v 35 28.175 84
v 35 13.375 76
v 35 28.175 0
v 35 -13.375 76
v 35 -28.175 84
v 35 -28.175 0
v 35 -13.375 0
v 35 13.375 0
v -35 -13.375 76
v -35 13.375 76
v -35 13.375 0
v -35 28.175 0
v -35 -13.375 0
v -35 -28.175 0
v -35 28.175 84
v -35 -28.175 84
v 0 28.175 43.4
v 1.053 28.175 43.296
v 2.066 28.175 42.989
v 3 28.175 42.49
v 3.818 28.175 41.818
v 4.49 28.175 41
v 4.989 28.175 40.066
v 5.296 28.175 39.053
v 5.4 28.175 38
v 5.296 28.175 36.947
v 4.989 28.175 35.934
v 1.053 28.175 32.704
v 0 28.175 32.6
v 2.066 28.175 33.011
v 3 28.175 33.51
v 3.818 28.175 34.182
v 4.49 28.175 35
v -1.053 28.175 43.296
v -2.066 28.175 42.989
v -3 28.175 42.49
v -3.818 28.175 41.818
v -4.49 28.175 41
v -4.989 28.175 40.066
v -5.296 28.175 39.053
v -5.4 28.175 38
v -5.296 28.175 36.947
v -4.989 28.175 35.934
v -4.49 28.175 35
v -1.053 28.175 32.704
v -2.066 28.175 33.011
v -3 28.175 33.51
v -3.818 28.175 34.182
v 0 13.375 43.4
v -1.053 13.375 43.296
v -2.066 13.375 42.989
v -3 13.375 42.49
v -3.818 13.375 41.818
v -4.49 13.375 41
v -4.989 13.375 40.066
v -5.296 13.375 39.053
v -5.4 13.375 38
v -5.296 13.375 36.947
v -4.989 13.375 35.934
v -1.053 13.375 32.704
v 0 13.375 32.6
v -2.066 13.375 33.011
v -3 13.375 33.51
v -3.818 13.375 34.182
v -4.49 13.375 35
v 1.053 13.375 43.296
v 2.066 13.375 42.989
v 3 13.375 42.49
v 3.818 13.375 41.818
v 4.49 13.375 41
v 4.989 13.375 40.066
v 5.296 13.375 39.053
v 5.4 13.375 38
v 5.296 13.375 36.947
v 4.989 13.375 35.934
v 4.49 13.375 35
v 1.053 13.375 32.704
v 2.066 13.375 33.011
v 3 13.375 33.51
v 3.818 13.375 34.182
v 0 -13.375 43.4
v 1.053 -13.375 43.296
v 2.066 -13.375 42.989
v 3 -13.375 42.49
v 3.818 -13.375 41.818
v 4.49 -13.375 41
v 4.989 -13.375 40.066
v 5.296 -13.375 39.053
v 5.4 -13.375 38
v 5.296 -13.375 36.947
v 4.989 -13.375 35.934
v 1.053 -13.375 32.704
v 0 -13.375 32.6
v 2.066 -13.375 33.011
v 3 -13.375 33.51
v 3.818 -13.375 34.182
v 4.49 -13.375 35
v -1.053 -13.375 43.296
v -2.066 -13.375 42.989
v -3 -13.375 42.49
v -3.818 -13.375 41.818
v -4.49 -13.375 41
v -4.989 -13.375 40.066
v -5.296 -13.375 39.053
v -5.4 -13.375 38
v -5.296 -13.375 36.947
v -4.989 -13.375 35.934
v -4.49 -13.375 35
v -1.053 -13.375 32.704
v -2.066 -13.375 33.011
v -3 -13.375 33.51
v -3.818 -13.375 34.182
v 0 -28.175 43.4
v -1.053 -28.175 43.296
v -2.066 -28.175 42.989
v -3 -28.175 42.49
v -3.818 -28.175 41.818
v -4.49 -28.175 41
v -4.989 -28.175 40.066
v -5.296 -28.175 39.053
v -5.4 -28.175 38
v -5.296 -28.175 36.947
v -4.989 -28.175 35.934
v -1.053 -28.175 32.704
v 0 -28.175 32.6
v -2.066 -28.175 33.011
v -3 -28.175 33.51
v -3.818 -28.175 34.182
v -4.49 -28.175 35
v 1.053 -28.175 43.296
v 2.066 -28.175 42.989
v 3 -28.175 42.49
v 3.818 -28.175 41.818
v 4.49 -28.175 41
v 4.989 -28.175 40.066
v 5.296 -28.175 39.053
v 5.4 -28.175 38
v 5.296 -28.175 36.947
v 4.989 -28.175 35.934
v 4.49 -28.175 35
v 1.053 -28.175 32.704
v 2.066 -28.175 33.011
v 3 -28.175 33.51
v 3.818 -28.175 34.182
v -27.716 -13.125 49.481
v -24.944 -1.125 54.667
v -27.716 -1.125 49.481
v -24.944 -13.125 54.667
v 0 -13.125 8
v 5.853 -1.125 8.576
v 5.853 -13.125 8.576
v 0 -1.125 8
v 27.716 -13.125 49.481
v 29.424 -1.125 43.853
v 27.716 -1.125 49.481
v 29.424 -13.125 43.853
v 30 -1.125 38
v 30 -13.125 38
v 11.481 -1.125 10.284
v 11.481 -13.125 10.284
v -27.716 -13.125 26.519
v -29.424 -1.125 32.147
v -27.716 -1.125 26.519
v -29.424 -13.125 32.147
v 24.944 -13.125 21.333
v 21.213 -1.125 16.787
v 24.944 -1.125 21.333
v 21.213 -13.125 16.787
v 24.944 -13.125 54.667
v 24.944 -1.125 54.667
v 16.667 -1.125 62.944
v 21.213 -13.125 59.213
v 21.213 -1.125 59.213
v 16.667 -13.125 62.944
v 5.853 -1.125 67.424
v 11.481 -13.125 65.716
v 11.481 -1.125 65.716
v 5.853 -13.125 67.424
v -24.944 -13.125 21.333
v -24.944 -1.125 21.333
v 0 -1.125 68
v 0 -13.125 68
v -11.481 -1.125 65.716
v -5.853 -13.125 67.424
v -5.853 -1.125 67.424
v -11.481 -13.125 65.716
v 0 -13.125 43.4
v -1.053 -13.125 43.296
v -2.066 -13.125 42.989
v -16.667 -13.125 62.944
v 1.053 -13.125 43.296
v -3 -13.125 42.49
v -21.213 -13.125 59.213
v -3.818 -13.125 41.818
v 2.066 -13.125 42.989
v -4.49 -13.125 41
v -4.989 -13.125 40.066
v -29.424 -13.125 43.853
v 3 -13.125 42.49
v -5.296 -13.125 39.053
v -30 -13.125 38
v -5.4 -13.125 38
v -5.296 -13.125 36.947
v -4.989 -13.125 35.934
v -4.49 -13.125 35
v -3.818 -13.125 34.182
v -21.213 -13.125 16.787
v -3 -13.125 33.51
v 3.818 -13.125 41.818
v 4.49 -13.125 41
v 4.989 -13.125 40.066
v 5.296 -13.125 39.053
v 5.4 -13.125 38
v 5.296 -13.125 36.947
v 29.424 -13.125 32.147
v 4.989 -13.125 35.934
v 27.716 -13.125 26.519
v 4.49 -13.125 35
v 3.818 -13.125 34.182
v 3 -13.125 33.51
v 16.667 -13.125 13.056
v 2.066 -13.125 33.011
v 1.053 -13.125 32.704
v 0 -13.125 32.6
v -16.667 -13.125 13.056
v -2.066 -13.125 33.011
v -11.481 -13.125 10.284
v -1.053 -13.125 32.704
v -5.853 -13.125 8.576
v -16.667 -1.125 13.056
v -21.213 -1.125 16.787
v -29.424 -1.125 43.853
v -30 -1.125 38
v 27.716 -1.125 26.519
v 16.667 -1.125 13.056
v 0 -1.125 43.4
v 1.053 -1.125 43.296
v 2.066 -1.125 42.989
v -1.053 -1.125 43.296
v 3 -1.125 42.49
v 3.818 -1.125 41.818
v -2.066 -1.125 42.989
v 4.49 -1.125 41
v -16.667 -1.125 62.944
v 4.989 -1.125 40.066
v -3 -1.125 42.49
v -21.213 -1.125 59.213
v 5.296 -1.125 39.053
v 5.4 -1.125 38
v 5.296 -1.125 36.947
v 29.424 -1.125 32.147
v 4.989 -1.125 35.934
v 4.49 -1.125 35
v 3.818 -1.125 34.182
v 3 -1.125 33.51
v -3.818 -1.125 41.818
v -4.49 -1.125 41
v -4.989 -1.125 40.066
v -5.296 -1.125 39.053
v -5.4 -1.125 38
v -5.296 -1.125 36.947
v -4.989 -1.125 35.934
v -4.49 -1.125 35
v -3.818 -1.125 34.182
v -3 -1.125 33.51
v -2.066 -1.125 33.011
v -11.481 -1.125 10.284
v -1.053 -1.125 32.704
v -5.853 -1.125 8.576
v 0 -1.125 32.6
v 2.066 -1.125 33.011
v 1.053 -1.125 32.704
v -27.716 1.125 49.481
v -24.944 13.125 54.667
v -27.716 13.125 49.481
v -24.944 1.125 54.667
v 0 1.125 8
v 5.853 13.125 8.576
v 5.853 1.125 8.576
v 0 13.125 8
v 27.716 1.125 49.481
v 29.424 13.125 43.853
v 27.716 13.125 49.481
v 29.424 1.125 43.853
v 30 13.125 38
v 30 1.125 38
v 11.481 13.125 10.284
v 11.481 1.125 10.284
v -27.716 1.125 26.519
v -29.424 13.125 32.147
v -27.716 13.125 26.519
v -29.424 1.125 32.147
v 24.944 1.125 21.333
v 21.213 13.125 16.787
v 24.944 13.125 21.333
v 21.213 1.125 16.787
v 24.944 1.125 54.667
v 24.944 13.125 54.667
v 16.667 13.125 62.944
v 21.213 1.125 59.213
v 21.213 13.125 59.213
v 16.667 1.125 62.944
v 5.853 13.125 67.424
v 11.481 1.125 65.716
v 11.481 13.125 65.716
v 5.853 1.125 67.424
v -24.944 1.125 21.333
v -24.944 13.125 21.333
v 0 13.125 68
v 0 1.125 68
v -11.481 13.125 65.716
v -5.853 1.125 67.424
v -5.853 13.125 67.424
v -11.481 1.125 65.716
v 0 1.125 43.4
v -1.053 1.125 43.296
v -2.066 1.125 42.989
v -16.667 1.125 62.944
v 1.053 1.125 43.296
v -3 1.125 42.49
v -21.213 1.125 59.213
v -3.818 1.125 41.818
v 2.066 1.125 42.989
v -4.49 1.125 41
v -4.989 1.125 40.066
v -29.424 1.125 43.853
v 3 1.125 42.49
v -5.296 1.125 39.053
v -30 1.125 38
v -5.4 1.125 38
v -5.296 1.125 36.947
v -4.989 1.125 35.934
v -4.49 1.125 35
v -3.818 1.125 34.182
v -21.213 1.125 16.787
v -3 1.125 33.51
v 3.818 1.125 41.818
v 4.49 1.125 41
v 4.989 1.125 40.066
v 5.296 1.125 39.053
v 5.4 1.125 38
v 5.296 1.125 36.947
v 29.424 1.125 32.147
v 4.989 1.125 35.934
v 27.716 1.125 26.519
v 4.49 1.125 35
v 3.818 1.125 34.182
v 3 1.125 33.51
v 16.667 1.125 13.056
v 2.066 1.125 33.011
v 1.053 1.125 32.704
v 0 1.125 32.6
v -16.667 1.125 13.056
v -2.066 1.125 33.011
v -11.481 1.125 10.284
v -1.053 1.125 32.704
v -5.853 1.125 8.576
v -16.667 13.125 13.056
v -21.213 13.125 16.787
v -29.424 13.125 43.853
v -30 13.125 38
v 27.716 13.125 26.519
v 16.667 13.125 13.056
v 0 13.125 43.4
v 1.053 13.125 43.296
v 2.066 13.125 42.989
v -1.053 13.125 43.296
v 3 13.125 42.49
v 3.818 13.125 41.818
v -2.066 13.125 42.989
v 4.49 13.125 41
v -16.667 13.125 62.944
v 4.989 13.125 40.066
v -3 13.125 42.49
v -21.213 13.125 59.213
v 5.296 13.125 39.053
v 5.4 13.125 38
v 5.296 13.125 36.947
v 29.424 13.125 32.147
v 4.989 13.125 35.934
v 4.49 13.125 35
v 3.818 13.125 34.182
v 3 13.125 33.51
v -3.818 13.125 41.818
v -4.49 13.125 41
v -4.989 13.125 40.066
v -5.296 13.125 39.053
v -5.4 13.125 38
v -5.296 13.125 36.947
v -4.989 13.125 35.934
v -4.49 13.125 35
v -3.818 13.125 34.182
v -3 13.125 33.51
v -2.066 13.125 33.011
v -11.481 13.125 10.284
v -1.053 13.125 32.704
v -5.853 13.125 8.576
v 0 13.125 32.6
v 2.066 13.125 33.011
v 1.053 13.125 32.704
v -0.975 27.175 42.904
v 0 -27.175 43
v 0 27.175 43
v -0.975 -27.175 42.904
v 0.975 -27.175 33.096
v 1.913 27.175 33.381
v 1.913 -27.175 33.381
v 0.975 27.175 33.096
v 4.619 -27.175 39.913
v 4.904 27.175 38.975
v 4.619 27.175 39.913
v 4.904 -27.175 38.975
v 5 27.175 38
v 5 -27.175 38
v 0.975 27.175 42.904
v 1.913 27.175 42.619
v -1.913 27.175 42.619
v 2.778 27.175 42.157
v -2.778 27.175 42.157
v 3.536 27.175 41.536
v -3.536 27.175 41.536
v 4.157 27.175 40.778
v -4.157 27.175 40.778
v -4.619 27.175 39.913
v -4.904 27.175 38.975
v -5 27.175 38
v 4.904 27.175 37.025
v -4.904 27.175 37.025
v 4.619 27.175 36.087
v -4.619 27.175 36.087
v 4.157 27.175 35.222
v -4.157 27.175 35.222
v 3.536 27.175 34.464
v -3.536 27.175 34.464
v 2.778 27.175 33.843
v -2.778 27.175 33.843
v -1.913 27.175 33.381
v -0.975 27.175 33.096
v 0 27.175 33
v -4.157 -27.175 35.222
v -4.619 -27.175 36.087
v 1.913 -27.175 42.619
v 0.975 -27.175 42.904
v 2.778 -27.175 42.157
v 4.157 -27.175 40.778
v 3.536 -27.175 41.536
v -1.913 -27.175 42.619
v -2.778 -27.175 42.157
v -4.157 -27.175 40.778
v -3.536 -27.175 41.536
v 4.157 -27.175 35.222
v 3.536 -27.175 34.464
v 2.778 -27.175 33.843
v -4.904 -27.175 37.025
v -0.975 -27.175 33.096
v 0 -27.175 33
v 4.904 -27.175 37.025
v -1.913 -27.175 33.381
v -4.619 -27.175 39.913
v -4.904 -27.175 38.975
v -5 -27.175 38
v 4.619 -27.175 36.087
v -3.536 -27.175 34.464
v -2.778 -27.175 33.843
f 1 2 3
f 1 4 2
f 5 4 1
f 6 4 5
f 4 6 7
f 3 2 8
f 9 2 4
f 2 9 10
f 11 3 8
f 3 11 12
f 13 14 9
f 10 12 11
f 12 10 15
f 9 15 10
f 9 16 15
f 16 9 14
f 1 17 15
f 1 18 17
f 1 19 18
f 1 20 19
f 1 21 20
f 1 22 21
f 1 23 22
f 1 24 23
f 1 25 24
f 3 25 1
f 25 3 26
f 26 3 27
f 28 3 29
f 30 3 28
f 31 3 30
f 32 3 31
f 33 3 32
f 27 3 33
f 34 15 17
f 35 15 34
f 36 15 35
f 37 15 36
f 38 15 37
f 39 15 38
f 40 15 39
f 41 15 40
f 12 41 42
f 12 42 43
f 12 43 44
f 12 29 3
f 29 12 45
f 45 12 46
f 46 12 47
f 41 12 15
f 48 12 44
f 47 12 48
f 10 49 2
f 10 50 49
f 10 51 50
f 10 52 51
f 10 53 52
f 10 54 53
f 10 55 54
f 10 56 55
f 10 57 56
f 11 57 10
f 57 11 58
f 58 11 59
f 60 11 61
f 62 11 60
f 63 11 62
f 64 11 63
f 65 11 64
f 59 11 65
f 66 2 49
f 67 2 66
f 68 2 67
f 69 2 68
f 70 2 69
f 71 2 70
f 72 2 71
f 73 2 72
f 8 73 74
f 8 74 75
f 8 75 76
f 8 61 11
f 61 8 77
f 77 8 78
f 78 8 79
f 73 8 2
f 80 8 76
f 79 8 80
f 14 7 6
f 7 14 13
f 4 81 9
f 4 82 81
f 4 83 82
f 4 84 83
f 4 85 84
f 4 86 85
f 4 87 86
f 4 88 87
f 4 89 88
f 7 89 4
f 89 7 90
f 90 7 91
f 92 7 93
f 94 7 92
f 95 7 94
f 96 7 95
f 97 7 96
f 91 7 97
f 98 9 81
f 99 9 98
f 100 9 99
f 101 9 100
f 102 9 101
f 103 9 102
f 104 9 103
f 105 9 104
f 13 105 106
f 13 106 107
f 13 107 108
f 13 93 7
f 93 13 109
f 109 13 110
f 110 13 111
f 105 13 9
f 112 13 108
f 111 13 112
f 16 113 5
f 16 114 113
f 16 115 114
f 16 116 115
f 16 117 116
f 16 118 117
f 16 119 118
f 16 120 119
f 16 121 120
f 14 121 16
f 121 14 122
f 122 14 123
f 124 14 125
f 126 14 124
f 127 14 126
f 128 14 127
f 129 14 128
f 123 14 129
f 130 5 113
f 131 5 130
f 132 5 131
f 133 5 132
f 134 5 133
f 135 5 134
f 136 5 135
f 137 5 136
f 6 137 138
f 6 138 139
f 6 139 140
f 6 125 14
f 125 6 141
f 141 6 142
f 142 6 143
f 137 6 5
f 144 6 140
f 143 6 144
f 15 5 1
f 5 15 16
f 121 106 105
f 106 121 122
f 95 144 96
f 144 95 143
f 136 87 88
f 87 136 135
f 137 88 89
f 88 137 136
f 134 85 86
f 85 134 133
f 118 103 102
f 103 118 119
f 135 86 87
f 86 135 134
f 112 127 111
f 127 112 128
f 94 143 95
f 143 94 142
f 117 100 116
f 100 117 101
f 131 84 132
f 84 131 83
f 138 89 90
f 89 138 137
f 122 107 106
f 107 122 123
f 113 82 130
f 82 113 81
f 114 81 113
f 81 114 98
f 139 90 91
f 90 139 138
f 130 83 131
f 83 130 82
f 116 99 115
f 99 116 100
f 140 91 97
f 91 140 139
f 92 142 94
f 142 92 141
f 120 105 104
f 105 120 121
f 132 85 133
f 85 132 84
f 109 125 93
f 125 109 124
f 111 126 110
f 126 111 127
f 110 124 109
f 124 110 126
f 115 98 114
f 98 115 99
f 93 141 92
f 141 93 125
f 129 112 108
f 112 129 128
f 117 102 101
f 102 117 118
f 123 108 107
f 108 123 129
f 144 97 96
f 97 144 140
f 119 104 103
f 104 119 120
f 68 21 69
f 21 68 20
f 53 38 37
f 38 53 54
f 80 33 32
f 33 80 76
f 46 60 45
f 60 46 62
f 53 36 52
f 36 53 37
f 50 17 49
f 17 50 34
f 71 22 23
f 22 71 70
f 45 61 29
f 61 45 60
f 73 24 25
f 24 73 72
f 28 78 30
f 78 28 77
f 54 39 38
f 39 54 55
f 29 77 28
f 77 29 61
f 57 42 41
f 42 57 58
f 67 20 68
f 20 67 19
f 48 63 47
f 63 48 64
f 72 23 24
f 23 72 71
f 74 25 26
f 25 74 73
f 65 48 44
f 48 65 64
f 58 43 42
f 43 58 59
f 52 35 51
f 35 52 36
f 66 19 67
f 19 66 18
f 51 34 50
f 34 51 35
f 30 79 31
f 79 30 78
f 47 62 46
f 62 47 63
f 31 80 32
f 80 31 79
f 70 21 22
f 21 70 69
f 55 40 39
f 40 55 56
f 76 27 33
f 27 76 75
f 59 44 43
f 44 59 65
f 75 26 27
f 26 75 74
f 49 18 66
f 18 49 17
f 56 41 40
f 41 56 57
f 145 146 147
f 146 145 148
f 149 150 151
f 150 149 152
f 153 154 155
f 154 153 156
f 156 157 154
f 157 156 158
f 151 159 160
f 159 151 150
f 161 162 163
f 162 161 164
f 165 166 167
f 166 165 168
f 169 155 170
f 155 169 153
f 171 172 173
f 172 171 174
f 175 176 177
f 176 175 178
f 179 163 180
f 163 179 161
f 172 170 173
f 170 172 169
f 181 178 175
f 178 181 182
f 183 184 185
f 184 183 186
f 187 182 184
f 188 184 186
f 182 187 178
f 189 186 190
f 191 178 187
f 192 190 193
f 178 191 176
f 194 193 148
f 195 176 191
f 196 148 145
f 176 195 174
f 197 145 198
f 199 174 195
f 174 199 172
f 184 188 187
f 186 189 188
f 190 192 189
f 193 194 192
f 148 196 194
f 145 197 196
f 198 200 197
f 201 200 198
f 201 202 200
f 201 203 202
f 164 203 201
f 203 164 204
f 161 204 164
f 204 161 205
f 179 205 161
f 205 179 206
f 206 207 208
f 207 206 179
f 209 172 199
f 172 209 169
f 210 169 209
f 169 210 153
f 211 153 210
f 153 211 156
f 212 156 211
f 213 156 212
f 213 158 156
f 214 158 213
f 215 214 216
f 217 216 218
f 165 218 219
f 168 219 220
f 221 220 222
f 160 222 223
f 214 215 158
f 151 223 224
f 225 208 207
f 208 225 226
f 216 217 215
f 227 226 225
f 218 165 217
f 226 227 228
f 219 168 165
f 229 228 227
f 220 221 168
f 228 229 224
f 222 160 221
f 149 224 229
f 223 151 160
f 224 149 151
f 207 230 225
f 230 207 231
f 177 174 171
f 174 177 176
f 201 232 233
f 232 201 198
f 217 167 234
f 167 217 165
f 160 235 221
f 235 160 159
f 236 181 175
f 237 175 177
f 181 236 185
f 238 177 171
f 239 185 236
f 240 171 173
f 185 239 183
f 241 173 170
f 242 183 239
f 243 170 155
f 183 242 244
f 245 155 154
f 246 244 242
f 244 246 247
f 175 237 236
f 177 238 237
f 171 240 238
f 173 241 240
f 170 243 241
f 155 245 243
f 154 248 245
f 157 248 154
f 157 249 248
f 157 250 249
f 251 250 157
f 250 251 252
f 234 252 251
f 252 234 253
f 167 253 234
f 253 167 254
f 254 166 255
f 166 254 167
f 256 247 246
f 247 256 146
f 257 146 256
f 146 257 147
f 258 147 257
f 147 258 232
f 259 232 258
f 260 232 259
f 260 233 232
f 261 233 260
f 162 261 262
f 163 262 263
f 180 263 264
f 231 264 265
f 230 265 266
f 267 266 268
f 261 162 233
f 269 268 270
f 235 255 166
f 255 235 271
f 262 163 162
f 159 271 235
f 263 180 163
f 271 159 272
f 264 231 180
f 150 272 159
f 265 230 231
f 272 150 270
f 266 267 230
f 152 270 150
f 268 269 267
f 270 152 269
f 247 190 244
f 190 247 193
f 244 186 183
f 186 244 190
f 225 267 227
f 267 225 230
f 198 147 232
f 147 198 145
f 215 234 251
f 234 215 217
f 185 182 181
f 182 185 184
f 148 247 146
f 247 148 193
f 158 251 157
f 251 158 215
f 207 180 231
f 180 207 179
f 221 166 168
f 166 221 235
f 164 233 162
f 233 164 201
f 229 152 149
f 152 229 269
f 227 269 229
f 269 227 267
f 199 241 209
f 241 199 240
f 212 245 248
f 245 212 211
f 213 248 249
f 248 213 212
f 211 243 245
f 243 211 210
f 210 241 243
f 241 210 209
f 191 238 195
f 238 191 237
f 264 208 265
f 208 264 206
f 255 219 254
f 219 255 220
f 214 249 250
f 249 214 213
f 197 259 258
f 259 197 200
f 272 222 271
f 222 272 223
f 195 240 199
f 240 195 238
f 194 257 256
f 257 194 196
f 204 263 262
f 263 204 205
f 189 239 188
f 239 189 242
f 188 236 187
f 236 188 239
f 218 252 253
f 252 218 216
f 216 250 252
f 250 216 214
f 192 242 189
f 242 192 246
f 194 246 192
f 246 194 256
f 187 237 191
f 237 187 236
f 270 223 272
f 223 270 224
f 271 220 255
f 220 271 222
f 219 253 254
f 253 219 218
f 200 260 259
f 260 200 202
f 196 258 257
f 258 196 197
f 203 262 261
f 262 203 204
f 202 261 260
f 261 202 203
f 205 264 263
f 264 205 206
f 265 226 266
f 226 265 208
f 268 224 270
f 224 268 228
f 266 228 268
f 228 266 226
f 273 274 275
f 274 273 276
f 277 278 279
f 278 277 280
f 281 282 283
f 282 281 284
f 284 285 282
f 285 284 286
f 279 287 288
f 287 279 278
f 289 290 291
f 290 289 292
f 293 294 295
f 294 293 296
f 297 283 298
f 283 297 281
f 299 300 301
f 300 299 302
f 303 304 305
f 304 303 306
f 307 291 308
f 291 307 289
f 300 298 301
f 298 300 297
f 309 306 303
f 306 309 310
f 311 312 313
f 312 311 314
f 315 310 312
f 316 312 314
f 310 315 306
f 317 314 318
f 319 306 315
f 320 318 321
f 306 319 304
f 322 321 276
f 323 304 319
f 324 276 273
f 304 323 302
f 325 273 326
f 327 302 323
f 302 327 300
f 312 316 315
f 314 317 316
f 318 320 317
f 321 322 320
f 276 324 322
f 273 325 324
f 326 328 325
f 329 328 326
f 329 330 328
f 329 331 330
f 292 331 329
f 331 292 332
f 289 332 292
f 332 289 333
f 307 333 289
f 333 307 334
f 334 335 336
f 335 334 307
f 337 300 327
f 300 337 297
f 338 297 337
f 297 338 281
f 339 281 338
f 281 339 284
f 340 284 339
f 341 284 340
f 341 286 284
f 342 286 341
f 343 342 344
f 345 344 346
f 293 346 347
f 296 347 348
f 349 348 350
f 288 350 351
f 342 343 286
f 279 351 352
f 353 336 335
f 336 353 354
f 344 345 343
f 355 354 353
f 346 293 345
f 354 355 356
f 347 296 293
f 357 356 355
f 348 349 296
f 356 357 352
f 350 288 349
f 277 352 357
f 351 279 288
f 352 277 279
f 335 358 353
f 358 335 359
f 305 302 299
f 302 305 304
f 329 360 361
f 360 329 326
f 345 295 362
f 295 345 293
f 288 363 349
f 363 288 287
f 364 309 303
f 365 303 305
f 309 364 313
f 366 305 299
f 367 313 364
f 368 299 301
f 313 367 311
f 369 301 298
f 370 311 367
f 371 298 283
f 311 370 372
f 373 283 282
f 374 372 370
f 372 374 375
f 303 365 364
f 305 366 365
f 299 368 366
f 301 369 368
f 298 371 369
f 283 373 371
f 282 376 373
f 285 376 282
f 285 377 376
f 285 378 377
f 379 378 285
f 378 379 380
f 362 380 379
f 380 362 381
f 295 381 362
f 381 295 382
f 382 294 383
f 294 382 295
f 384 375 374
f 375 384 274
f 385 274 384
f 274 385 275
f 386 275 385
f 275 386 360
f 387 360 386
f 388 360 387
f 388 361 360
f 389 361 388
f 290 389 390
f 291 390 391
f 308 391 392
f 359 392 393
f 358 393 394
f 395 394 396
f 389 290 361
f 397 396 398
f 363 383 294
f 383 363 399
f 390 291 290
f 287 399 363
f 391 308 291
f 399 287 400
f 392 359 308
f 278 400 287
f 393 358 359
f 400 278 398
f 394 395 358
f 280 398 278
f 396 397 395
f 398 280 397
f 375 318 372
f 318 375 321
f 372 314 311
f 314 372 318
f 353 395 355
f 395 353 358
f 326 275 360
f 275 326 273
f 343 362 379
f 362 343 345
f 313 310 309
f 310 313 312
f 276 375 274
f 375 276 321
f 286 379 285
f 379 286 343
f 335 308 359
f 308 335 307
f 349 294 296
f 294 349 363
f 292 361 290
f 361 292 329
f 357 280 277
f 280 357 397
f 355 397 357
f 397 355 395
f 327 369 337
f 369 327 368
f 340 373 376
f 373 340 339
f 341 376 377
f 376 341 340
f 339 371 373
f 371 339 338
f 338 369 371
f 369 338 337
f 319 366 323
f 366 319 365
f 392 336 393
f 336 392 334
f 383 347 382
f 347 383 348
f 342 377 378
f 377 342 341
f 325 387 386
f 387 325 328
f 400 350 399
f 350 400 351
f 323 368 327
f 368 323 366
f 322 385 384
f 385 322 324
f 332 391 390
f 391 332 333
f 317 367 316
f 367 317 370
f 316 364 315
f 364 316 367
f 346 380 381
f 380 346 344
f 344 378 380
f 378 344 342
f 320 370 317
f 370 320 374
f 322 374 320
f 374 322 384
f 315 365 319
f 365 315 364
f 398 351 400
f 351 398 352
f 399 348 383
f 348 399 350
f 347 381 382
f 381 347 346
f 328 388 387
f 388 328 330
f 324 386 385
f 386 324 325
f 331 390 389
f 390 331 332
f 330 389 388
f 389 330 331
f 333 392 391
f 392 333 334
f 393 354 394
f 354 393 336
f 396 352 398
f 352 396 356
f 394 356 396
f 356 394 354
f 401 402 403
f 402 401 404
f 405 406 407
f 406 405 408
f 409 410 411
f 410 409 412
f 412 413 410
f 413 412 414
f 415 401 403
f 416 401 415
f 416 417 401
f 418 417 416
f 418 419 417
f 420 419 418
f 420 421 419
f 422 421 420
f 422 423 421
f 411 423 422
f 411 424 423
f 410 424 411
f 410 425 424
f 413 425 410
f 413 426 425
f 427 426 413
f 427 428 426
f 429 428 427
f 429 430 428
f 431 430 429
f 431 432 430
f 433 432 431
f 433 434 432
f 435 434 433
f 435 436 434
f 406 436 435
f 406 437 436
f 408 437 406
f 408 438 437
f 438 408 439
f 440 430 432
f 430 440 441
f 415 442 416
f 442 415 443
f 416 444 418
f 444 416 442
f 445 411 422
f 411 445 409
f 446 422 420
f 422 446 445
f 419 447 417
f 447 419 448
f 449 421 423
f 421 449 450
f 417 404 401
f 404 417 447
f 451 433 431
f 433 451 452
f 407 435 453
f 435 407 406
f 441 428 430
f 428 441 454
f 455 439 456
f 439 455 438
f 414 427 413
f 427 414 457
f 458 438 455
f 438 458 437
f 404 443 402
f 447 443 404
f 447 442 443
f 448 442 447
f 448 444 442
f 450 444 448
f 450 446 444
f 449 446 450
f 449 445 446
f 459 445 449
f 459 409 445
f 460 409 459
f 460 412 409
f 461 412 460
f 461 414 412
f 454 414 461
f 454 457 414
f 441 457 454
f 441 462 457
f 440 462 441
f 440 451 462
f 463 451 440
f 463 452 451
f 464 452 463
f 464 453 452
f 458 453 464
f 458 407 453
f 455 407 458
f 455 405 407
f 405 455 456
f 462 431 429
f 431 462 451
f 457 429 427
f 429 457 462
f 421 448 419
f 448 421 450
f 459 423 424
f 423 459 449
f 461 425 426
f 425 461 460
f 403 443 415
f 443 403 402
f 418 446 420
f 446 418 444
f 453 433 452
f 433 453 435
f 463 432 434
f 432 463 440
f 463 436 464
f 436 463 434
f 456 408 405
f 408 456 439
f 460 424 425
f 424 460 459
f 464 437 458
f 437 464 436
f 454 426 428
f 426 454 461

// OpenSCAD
$fn = 32;

// ------------------------------------------------------------------------
// Trolley wheel set: wheels d60, fork 76 mm tall
// Every part is its own module, assembly() places every instance.
// ------------------------------------------------------------------------

// --- part 1 ---
module trolley_fork() {
  difference() {
    union() {
      translate([-35, 13.375, 0]) cube([70, 14.8, 76]);
      translate([-35, -28.175, 0]) cube([70, 14.8, 76]);
      translate([-35, -28.175, 76]) cube([70, 56.35, 8]);
    }
    translate([0, -20.775, 38]) rotate([90, 0, 0]) cylinder(h = 16.8, d = 10.8, center = true);
    translate([0, 20.775, 38]) rotate([90, 0, 0]) cylinder(h = 16.8, d = 10.8, center = true);
  }
}

// --- part 2 ---
module trolley_wheel() {
  difference() {
      translate([0, 0, 0]) cylinder(h = 12, d = 60);
      translate([0, 0, -1]) cylinder(h = 14, d = 10.8);
    }
}

// --- part 3 ---
module trolley_axle() {
  translate([0, 0, -27.175]) cylinder(h = 54.35, d = 10);
}

// --- assembly ---
module assembly() {
  color([0.80, 0.24, 0.20]) translate([0, 0, 0]) rotate([0, 0, 0]) trolley_fork();
  color([0.20, 0.45, 0.75]) translate([0, -1.125, 38]) rotate([90, 0, 0]) trolley_wheel();
  color([0.25, 0.62, 0.32]) translate([0, 13.125, 38]) rotate([90, 0, 0]) trolley_wheel();
  color([0.92, 0.70, 0.18]) translate([0, 0, 38]) rotate([90, 0, 0]) trolley_axle();
}

assembly();
